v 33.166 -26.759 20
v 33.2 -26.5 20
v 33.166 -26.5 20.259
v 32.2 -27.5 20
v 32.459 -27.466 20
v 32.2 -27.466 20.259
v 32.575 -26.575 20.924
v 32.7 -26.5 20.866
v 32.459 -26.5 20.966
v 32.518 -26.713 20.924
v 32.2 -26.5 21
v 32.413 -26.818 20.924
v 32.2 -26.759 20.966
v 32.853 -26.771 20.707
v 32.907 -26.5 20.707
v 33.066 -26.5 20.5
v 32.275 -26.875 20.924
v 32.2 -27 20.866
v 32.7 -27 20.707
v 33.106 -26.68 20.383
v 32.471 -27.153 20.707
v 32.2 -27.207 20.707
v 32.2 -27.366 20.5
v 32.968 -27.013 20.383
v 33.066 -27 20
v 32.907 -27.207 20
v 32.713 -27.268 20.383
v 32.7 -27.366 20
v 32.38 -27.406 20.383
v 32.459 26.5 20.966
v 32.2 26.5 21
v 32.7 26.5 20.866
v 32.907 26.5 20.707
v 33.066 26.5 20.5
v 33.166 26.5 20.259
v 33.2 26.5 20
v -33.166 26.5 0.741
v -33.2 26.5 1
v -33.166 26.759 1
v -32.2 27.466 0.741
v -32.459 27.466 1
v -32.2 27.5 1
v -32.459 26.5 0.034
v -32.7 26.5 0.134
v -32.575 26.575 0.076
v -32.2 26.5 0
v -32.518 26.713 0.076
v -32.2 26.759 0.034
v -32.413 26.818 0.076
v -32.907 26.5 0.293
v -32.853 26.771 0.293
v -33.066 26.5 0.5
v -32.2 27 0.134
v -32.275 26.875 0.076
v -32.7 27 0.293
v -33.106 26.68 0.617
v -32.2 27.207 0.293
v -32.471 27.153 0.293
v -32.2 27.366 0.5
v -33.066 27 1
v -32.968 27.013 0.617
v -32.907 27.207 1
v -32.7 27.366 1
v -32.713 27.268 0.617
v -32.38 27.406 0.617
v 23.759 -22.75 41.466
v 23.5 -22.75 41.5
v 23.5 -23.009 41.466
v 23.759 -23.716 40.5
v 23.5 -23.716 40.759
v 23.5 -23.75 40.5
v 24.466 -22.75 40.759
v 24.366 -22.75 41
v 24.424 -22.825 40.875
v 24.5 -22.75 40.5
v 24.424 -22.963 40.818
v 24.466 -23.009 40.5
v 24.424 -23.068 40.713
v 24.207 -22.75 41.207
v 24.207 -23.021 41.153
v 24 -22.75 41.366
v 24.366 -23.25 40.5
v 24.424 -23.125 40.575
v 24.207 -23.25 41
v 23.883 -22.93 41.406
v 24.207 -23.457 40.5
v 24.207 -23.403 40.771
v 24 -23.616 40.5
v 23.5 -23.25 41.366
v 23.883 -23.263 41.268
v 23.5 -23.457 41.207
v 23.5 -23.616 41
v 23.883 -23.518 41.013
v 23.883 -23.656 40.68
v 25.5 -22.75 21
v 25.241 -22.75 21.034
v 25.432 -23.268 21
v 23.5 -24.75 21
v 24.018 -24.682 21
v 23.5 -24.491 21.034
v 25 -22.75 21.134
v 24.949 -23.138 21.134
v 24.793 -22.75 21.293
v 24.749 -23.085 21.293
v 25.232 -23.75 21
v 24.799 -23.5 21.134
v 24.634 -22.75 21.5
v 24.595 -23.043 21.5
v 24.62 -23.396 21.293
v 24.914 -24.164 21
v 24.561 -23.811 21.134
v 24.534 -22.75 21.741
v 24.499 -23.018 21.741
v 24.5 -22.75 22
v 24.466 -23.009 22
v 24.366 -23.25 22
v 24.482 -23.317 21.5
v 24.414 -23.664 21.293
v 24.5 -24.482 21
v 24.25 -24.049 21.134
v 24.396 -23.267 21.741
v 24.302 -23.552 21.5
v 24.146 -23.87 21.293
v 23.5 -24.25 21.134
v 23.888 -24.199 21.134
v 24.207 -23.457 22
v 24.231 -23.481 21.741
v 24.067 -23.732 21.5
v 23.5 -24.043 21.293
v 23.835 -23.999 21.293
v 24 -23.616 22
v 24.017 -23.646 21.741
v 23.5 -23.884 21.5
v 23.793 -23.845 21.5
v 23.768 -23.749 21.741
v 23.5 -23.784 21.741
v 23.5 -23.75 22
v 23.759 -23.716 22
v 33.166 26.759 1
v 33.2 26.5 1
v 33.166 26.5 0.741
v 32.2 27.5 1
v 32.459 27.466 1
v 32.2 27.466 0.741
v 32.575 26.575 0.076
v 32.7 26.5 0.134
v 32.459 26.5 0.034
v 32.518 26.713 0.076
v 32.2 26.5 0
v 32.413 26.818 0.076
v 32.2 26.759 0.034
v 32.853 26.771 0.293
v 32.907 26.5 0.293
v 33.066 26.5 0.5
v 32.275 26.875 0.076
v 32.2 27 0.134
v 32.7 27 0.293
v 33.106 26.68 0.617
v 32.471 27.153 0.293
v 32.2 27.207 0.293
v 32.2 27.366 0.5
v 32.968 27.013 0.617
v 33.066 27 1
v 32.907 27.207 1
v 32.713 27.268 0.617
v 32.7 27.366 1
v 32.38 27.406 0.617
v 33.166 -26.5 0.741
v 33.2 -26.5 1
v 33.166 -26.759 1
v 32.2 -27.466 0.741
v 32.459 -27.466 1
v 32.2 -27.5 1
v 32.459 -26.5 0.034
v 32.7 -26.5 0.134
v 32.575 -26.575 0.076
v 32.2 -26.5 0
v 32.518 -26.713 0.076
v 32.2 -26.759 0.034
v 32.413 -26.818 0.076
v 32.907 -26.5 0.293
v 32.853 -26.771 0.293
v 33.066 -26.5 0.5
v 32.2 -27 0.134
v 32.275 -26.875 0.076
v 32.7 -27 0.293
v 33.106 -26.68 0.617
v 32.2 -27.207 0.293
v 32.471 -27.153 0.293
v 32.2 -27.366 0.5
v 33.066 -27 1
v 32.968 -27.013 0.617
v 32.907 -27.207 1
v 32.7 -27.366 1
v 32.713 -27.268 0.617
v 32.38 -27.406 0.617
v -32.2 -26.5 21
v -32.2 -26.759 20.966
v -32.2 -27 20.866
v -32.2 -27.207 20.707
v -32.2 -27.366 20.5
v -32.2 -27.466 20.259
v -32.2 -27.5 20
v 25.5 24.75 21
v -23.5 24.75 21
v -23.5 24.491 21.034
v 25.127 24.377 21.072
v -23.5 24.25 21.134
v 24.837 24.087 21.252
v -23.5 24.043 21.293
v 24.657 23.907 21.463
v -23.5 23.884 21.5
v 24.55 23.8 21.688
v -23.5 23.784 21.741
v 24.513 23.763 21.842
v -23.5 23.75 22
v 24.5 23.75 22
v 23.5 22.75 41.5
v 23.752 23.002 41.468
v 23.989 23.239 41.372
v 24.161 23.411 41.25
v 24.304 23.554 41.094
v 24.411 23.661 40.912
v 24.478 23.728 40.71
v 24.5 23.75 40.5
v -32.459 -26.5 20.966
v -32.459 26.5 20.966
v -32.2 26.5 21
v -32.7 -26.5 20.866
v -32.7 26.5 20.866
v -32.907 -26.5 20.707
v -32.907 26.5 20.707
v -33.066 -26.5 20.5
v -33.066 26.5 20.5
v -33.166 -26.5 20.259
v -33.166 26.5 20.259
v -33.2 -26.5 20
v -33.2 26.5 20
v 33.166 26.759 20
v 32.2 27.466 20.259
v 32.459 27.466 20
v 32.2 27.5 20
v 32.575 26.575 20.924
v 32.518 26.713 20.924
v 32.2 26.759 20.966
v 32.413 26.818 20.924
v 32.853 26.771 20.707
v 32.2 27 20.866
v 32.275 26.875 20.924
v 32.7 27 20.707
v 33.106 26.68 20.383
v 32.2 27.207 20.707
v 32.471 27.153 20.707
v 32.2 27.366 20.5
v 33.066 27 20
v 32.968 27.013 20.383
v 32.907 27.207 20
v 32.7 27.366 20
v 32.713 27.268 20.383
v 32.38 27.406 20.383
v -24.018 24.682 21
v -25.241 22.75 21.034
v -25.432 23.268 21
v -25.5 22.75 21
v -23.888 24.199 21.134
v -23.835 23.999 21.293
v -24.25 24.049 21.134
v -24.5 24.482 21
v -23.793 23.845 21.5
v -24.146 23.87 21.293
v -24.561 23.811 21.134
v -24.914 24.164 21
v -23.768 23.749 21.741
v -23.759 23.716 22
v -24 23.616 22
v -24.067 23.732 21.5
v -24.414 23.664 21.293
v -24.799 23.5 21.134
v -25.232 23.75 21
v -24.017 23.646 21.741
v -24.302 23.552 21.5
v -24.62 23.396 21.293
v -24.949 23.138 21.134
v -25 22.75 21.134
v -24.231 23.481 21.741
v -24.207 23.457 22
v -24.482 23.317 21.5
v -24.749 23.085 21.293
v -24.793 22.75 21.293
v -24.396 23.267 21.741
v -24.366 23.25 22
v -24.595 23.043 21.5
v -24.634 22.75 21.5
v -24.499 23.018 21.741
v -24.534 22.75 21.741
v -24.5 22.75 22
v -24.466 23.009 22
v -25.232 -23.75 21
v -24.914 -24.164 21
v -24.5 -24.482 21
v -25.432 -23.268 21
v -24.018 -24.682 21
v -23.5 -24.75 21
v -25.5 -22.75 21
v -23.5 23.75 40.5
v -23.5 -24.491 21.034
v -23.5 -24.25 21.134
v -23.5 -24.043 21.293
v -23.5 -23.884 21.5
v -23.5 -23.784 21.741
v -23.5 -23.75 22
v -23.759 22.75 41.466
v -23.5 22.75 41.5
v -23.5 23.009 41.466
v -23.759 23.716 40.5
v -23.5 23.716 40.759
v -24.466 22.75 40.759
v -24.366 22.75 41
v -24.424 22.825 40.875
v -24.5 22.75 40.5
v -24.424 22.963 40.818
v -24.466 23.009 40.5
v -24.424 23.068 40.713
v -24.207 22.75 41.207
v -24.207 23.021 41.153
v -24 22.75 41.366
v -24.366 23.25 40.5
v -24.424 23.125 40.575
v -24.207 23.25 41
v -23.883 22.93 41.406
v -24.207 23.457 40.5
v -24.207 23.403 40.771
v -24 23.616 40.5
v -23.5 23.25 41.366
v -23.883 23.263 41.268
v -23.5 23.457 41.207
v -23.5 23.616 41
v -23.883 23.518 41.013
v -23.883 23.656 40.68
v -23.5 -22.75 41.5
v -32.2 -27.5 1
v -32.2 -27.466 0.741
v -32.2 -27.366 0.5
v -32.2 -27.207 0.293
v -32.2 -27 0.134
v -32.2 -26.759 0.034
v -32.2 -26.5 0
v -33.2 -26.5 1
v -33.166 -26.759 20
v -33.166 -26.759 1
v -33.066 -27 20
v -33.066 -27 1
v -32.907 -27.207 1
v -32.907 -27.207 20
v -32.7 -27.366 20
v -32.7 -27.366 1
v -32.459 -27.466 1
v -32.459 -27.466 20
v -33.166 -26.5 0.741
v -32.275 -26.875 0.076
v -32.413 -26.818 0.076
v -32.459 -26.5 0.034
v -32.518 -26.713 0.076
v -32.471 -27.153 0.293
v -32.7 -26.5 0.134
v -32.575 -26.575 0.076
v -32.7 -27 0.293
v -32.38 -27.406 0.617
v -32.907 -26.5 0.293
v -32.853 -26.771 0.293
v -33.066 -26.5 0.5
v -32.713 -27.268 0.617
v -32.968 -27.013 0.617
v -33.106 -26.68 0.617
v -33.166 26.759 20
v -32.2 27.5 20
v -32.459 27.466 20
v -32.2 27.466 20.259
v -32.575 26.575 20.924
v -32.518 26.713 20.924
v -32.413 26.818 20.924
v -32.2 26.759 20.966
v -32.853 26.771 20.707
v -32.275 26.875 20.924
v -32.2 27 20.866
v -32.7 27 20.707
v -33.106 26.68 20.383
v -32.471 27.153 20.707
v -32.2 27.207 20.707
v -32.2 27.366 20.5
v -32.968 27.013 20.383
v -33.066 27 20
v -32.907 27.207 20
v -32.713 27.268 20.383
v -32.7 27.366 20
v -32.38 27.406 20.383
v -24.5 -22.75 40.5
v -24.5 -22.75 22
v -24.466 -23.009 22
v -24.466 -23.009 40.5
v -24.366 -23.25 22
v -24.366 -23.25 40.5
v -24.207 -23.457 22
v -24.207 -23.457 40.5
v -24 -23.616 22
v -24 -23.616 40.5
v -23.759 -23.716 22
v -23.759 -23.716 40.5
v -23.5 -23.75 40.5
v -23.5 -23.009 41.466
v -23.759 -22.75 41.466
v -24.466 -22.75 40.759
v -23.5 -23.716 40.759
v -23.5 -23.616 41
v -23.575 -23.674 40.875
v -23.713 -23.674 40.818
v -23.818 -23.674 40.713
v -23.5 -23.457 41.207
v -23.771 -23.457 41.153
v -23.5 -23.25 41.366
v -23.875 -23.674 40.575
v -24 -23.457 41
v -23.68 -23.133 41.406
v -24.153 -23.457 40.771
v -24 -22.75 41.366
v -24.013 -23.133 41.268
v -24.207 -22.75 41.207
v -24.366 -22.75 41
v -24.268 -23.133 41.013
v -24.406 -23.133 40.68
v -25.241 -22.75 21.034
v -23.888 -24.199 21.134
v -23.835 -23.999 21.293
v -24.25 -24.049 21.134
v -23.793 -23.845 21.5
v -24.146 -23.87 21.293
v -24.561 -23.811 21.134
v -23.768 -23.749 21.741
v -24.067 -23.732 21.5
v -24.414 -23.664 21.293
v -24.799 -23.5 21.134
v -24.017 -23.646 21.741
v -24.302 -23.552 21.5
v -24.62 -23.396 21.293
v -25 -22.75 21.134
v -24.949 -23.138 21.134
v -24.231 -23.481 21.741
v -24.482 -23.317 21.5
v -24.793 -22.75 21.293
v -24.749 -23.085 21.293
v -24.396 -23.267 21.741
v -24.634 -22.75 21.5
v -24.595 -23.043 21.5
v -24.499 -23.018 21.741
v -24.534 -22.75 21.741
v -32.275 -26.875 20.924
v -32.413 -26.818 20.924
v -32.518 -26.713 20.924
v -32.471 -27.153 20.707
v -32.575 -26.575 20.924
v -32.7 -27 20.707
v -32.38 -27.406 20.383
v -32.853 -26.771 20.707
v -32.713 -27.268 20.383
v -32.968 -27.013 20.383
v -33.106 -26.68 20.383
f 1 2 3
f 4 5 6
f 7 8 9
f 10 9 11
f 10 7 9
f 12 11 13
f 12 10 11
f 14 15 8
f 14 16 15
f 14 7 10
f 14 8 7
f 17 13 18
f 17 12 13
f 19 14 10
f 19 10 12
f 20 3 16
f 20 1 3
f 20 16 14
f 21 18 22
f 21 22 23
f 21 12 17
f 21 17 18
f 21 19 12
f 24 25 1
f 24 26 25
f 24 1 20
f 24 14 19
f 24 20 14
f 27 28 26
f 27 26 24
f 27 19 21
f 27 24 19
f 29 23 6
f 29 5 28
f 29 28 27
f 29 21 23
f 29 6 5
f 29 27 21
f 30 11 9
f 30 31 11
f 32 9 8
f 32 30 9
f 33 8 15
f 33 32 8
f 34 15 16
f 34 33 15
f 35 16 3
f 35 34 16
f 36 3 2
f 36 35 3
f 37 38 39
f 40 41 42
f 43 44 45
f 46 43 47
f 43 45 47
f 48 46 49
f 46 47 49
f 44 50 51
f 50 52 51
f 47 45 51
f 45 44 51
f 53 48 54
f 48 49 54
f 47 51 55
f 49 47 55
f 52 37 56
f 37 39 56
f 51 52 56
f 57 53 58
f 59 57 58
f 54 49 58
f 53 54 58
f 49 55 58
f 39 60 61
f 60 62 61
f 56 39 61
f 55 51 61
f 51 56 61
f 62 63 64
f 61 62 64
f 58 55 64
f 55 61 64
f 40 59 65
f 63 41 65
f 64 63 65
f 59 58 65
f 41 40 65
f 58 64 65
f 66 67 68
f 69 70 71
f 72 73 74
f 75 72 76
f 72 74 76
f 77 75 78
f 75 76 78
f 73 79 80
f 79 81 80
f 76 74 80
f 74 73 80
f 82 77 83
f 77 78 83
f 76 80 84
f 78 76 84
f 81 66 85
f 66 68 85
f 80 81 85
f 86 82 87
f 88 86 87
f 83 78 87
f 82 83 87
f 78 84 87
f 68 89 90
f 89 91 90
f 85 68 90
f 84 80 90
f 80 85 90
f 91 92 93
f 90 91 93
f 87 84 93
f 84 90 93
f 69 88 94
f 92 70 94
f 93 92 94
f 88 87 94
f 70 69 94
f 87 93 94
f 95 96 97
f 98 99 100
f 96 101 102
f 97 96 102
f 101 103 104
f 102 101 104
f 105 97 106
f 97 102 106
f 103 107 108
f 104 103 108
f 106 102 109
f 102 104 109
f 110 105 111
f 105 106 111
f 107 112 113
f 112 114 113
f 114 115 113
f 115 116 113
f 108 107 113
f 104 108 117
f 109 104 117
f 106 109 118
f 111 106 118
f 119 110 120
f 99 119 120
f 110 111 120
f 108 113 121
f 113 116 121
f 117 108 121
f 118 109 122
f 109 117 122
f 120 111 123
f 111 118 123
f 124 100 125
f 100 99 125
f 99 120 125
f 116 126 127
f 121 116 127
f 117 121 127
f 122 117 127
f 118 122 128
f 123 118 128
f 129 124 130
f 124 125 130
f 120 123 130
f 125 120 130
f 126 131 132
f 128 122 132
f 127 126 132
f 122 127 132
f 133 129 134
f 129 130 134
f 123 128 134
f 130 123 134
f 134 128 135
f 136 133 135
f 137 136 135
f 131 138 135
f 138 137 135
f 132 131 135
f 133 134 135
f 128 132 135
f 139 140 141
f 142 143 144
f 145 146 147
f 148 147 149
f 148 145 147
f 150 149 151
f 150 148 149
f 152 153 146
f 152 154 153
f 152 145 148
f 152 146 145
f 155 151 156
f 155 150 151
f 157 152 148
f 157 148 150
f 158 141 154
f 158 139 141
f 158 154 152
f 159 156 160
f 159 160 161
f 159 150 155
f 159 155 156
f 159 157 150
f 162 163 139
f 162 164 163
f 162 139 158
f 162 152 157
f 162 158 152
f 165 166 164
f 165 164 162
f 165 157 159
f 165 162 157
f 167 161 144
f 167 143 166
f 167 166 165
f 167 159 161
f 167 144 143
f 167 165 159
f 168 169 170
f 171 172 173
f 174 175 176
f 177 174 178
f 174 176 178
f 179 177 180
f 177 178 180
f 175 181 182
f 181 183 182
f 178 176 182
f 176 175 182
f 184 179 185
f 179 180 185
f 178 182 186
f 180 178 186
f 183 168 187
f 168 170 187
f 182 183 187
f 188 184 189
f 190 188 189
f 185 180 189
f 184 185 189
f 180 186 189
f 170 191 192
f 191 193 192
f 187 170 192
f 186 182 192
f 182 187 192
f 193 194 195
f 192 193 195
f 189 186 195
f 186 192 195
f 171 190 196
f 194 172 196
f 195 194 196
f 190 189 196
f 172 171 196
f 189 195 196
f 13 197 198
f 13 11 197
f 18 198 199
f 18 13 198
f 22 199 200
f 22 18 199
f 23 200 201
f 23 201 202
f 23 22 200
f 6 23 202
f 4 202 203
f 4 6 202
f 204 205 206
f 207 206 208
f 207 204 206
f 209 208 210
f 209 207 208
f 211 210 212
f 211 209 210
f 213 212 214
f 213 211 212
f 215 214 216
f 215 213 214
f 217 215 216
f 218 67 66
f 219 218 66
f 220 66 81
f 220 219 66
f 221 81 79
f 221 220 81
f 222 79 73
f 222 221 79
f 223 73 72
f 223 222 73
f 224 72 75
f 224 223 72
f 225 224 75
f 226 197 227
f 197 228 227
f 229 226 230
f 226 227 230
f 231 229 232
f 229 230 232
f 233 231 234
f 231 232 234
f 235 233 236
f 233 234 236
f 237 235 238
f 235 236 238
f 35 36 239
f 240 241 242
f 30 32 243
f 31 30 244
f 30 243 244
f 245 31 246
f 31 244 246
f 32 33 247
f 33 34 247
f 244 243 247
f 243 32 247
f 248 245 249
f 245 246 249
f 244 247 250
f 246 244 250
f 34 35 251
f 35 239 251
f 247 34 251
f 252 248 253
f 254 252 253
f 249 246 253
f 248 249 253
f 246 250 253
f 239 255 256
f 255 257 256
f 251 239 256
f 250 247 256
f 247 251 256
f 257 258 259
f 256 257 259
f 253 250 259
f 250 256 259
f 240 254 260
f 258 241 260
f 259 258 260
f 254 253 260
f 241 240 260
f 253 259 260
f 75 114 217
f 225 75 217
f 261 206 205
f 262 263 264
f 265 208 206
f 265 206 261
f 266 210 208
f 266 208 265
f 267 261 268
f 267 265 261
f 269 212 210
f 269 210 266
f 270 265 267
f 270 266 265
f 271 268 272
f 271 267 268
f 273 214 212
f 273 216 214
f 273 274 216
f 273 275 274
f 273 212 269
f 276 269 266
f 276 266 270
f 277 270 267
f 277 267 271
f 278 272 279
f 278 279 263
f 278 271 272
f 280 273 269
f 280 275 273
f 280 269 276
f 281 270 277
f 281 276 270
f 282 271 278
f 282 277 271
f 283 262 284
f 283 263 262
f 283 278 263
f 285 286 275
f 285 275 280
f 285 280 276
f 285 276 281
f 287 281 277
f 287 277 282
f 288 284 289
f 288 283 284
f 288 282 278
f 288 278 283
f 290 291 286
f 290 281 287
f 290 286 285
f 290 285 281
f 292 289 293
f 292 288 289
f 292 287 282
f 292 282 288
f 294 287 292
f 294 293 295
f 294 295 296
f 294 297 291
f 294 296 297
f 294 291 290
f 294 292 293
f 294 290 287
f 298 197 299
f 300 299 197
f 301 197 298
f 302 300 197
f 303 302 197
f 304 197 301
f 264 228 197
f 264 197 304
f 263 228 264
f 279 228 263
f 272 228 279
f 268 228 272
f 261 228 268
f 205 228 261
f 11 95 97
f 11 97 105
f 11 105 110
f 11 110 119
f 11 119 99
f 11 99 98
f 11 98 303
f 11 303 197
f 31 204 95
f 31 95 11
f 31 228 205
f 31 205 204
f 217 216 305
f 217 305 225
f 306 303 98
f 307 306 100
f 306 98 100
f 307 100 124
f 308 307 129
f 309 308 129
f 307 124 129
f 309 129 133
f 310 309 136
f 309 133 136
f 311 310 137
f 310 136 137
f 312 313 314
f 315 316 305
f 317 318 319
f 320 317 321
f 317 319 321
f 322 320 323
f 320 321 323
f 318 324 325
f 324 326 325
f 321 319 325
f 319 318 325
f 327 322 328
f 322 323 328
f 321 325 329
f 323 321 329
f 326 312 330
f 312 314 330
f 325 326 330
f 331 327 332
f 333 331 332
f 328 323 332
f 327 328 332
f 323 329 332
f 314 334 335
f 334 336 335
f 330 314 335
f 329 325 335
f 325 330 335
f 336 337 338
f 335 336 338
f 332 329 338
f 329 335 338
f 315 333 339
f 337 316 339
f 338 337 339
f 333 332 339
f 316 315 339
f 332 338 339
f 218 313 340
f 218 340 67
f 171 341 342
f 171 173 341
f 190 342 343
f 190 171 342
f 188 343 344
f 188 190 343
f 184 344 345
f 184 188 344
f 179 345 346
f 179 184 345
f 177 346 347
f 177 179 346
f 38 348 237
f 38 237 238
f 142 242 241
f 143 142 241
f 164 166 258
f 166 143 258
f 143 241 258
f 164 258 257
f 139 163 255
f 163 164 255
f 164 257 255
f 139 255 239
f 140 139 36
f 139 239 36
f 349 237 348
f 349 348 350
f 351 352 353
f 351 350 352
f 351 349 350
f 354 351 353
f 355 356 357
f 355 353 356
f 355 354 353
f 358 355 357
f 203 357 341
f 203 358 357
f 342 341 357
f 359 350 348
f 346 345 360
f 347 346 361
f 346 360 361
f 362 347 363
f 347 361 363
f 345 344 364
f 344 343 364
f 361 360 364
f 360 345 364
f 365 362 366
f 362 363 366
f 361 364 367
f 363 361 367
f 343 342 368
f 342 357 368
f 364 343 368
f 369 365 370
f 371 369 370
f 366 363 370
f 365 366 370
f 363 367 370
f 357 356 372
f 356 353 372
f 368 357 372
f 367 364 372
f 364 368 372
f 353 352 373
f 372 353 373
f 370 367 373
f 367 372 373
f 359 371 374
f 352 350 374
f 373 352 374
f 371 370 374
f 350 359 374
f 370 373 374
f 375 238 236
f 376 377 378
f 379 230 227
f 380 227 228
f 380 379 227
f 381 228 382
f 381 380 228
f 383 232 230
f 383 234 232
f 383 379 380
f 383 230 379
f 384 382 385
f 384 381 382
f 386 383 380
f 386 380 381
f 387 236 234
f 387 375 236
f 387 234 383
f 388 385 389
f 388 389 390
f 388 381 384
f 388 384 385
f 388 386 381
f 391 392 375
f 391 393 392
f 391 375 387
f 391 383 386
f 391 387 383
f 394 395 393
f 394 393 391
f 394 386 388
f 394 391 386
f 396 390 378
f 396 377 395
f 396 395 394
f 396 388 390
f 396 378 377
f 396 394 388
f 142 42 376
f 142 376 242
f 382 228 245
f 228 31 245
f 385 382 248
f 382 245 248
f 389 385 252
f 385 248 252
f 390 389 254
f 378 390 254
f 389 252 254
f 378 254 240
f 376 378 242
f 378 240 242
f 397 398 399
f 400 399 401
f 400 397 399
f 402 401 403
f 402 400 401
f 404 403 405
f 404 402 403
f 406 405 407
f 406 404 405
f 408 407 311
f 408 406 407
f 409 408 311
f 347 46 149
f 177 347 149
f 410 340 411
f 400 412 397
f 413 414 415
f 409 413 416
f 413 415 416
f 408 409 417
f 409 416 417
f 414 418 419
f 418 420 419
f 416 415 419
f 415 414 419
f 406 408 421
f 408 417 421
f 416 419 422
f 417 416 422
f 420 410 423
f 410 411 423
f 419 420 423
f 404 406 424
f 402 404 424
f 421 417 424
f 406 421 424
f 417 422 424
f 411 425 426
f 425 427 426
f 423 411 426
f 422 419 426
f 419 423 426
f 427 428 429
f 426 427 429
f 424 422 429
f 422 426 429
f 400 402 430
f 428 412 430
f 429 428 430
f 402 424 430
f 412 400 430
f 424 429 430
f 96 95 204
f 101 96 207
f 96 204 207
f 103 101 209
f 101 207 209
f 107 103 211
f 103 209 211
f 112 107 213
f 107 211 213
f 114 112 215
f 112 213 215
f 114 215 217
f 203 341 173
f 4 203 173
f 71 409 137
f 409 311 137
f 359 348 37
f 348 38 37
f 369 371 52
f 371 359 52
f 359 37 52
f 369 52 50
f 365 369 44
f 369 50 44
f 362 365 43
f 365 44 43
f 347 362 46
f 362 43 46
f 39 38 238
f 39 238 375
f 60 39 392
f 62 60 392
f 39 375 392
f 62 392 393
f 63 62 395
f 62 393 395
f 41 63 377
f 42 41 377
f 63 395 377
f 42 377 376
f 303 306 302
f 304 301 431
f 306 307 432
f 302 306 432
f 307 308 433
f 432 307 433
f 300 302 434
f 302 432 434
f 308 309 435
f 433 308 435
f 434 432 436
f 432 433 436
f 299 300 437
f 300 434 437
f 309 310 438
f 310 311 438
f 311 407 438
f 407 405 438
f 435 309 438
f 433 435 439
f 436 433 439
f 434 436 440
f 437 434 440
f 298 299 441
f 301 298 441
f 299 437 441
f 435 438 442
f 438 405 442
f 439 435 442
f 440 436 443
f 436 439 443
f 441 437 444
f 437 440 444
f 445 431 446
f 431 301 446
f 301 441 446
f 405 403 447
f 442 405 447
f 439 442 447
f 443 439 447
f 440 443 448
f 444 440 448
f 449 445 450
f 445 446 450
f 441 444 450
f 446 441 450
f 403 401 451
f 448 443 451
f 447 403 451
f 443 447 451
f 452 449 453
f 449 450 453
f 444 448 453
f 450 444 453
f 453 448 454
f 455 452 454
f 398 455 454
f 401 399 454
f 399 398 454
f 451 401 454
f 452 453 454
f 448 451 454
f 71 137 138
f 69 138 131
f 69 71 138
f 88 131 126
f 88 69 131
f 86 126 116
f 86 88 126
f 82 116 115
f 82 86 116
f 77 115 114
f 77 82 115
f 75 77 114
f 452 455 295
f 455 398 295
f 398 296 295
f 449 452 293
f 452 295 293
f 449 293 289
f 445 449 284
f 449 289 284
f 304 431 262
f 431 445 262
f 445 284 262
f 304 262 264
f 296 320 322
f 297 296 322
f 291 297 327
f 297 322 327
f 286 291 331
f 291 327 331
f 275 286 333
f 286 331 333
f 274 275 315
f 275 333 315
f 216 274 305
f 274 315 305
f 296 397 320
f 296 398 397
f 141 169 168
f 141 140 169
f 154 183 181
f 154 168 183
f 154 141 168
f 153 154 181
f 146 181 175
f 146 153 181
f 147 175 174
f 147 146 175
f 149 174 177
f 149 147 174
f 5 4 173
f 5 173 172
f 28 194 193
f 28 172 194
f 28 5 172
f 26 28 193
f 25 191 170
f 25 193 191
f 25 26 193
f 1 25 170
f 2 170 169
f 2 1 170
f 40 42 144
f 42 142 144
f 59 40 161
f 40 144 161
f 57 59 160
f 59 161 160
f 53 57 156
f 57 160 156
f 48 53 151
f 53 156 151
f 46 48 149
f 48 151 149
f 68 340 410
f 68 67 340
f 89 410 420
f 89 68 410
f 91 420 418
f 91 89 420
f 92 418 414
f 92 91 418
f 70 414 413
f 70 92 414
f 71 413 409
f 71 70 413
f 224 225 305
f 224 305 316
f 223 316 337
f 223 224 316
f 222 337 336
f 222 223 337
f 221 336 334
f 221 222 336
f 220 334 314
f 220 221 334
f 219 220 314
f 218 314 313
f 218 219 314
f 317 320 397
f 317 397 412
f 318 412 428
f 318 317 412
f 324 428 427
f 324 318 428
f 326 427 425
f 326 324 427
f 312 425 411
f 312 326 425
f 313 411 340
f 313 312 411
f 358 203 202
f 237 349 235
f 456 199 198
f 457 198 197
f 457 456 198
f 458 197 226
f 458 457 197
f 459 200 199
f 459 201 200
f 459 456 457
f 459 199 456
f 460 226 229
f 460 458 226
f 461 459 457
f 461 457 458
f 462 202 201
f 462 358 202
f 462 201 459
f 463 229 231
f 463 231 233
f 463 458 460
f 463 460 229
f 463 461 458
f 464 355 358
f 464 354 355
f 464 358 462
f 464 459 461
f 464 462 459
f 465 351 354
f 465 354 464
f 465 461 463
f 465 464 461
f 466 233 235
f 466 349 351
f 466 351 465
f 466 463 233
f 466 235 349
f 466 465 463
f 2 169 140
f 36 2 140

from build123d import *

# Parameters (mm, degrees)
F0_W     = 66.4
F0_H     = 55
F0_W_2   = 49
F0_H_2   = 47.5
F1_DEPTH = 21
F2_DEPTH = 41.5
F3_R     = 1


with BuildPart() as f1:
    # F0 (on Top) → F1 (new body)
    with BuildSketch(Plane.XY):
        Rectangle(F0_W, F0_H)
        Rectangle(F0_W_2, F0_H_2, mode=Mode.SUBTRACT)
    extrude(amount=F1_DEPTH)

    # F0 (on Top) → F2 (join)
    with BuildSketch(Plane.XY):
        Rectangle(F0_W_2, F0_H_2)
    extrude(amount=F2_DEPTH)

    # F3
    f3_edges = [f1.edges().sort_by_distance(p)[0] for p in [
        (0, 23.75, 41.5),
        (-24.5, 0, 41.5),
        (0, -23.75, 41.5),
        (24.5, 0, 41.5),
        (-24.5, 0, 21),
        (-24.5, -23.75, 31.25),
        (-24.5, 23.75, 31.25),
        (0, -23.75, 21),
        (24.5, -23.75, 31.25),
        (33.2, -27.5, 10.5),
        (33.2, 27.5, 10.5),
        (33.2, 0, 0),
        (33.2, 0, 21),
        (-33.2, -27.5, 10.5),
        (0, -27.5, 0),
        (0, -27.5, 21),
        (-33.2, 27.5, 10.5),
        (-33.2, 0, 0),
        (-33.2, 0, 21),
        (0, 27.5, 0),
        (0, 27.5, 21),
        (24.5, 0, 21),
        (0, 23.75, 21),
    ]]
    fillet(f3_edges, radius=F3_R)


solid = f1.part
